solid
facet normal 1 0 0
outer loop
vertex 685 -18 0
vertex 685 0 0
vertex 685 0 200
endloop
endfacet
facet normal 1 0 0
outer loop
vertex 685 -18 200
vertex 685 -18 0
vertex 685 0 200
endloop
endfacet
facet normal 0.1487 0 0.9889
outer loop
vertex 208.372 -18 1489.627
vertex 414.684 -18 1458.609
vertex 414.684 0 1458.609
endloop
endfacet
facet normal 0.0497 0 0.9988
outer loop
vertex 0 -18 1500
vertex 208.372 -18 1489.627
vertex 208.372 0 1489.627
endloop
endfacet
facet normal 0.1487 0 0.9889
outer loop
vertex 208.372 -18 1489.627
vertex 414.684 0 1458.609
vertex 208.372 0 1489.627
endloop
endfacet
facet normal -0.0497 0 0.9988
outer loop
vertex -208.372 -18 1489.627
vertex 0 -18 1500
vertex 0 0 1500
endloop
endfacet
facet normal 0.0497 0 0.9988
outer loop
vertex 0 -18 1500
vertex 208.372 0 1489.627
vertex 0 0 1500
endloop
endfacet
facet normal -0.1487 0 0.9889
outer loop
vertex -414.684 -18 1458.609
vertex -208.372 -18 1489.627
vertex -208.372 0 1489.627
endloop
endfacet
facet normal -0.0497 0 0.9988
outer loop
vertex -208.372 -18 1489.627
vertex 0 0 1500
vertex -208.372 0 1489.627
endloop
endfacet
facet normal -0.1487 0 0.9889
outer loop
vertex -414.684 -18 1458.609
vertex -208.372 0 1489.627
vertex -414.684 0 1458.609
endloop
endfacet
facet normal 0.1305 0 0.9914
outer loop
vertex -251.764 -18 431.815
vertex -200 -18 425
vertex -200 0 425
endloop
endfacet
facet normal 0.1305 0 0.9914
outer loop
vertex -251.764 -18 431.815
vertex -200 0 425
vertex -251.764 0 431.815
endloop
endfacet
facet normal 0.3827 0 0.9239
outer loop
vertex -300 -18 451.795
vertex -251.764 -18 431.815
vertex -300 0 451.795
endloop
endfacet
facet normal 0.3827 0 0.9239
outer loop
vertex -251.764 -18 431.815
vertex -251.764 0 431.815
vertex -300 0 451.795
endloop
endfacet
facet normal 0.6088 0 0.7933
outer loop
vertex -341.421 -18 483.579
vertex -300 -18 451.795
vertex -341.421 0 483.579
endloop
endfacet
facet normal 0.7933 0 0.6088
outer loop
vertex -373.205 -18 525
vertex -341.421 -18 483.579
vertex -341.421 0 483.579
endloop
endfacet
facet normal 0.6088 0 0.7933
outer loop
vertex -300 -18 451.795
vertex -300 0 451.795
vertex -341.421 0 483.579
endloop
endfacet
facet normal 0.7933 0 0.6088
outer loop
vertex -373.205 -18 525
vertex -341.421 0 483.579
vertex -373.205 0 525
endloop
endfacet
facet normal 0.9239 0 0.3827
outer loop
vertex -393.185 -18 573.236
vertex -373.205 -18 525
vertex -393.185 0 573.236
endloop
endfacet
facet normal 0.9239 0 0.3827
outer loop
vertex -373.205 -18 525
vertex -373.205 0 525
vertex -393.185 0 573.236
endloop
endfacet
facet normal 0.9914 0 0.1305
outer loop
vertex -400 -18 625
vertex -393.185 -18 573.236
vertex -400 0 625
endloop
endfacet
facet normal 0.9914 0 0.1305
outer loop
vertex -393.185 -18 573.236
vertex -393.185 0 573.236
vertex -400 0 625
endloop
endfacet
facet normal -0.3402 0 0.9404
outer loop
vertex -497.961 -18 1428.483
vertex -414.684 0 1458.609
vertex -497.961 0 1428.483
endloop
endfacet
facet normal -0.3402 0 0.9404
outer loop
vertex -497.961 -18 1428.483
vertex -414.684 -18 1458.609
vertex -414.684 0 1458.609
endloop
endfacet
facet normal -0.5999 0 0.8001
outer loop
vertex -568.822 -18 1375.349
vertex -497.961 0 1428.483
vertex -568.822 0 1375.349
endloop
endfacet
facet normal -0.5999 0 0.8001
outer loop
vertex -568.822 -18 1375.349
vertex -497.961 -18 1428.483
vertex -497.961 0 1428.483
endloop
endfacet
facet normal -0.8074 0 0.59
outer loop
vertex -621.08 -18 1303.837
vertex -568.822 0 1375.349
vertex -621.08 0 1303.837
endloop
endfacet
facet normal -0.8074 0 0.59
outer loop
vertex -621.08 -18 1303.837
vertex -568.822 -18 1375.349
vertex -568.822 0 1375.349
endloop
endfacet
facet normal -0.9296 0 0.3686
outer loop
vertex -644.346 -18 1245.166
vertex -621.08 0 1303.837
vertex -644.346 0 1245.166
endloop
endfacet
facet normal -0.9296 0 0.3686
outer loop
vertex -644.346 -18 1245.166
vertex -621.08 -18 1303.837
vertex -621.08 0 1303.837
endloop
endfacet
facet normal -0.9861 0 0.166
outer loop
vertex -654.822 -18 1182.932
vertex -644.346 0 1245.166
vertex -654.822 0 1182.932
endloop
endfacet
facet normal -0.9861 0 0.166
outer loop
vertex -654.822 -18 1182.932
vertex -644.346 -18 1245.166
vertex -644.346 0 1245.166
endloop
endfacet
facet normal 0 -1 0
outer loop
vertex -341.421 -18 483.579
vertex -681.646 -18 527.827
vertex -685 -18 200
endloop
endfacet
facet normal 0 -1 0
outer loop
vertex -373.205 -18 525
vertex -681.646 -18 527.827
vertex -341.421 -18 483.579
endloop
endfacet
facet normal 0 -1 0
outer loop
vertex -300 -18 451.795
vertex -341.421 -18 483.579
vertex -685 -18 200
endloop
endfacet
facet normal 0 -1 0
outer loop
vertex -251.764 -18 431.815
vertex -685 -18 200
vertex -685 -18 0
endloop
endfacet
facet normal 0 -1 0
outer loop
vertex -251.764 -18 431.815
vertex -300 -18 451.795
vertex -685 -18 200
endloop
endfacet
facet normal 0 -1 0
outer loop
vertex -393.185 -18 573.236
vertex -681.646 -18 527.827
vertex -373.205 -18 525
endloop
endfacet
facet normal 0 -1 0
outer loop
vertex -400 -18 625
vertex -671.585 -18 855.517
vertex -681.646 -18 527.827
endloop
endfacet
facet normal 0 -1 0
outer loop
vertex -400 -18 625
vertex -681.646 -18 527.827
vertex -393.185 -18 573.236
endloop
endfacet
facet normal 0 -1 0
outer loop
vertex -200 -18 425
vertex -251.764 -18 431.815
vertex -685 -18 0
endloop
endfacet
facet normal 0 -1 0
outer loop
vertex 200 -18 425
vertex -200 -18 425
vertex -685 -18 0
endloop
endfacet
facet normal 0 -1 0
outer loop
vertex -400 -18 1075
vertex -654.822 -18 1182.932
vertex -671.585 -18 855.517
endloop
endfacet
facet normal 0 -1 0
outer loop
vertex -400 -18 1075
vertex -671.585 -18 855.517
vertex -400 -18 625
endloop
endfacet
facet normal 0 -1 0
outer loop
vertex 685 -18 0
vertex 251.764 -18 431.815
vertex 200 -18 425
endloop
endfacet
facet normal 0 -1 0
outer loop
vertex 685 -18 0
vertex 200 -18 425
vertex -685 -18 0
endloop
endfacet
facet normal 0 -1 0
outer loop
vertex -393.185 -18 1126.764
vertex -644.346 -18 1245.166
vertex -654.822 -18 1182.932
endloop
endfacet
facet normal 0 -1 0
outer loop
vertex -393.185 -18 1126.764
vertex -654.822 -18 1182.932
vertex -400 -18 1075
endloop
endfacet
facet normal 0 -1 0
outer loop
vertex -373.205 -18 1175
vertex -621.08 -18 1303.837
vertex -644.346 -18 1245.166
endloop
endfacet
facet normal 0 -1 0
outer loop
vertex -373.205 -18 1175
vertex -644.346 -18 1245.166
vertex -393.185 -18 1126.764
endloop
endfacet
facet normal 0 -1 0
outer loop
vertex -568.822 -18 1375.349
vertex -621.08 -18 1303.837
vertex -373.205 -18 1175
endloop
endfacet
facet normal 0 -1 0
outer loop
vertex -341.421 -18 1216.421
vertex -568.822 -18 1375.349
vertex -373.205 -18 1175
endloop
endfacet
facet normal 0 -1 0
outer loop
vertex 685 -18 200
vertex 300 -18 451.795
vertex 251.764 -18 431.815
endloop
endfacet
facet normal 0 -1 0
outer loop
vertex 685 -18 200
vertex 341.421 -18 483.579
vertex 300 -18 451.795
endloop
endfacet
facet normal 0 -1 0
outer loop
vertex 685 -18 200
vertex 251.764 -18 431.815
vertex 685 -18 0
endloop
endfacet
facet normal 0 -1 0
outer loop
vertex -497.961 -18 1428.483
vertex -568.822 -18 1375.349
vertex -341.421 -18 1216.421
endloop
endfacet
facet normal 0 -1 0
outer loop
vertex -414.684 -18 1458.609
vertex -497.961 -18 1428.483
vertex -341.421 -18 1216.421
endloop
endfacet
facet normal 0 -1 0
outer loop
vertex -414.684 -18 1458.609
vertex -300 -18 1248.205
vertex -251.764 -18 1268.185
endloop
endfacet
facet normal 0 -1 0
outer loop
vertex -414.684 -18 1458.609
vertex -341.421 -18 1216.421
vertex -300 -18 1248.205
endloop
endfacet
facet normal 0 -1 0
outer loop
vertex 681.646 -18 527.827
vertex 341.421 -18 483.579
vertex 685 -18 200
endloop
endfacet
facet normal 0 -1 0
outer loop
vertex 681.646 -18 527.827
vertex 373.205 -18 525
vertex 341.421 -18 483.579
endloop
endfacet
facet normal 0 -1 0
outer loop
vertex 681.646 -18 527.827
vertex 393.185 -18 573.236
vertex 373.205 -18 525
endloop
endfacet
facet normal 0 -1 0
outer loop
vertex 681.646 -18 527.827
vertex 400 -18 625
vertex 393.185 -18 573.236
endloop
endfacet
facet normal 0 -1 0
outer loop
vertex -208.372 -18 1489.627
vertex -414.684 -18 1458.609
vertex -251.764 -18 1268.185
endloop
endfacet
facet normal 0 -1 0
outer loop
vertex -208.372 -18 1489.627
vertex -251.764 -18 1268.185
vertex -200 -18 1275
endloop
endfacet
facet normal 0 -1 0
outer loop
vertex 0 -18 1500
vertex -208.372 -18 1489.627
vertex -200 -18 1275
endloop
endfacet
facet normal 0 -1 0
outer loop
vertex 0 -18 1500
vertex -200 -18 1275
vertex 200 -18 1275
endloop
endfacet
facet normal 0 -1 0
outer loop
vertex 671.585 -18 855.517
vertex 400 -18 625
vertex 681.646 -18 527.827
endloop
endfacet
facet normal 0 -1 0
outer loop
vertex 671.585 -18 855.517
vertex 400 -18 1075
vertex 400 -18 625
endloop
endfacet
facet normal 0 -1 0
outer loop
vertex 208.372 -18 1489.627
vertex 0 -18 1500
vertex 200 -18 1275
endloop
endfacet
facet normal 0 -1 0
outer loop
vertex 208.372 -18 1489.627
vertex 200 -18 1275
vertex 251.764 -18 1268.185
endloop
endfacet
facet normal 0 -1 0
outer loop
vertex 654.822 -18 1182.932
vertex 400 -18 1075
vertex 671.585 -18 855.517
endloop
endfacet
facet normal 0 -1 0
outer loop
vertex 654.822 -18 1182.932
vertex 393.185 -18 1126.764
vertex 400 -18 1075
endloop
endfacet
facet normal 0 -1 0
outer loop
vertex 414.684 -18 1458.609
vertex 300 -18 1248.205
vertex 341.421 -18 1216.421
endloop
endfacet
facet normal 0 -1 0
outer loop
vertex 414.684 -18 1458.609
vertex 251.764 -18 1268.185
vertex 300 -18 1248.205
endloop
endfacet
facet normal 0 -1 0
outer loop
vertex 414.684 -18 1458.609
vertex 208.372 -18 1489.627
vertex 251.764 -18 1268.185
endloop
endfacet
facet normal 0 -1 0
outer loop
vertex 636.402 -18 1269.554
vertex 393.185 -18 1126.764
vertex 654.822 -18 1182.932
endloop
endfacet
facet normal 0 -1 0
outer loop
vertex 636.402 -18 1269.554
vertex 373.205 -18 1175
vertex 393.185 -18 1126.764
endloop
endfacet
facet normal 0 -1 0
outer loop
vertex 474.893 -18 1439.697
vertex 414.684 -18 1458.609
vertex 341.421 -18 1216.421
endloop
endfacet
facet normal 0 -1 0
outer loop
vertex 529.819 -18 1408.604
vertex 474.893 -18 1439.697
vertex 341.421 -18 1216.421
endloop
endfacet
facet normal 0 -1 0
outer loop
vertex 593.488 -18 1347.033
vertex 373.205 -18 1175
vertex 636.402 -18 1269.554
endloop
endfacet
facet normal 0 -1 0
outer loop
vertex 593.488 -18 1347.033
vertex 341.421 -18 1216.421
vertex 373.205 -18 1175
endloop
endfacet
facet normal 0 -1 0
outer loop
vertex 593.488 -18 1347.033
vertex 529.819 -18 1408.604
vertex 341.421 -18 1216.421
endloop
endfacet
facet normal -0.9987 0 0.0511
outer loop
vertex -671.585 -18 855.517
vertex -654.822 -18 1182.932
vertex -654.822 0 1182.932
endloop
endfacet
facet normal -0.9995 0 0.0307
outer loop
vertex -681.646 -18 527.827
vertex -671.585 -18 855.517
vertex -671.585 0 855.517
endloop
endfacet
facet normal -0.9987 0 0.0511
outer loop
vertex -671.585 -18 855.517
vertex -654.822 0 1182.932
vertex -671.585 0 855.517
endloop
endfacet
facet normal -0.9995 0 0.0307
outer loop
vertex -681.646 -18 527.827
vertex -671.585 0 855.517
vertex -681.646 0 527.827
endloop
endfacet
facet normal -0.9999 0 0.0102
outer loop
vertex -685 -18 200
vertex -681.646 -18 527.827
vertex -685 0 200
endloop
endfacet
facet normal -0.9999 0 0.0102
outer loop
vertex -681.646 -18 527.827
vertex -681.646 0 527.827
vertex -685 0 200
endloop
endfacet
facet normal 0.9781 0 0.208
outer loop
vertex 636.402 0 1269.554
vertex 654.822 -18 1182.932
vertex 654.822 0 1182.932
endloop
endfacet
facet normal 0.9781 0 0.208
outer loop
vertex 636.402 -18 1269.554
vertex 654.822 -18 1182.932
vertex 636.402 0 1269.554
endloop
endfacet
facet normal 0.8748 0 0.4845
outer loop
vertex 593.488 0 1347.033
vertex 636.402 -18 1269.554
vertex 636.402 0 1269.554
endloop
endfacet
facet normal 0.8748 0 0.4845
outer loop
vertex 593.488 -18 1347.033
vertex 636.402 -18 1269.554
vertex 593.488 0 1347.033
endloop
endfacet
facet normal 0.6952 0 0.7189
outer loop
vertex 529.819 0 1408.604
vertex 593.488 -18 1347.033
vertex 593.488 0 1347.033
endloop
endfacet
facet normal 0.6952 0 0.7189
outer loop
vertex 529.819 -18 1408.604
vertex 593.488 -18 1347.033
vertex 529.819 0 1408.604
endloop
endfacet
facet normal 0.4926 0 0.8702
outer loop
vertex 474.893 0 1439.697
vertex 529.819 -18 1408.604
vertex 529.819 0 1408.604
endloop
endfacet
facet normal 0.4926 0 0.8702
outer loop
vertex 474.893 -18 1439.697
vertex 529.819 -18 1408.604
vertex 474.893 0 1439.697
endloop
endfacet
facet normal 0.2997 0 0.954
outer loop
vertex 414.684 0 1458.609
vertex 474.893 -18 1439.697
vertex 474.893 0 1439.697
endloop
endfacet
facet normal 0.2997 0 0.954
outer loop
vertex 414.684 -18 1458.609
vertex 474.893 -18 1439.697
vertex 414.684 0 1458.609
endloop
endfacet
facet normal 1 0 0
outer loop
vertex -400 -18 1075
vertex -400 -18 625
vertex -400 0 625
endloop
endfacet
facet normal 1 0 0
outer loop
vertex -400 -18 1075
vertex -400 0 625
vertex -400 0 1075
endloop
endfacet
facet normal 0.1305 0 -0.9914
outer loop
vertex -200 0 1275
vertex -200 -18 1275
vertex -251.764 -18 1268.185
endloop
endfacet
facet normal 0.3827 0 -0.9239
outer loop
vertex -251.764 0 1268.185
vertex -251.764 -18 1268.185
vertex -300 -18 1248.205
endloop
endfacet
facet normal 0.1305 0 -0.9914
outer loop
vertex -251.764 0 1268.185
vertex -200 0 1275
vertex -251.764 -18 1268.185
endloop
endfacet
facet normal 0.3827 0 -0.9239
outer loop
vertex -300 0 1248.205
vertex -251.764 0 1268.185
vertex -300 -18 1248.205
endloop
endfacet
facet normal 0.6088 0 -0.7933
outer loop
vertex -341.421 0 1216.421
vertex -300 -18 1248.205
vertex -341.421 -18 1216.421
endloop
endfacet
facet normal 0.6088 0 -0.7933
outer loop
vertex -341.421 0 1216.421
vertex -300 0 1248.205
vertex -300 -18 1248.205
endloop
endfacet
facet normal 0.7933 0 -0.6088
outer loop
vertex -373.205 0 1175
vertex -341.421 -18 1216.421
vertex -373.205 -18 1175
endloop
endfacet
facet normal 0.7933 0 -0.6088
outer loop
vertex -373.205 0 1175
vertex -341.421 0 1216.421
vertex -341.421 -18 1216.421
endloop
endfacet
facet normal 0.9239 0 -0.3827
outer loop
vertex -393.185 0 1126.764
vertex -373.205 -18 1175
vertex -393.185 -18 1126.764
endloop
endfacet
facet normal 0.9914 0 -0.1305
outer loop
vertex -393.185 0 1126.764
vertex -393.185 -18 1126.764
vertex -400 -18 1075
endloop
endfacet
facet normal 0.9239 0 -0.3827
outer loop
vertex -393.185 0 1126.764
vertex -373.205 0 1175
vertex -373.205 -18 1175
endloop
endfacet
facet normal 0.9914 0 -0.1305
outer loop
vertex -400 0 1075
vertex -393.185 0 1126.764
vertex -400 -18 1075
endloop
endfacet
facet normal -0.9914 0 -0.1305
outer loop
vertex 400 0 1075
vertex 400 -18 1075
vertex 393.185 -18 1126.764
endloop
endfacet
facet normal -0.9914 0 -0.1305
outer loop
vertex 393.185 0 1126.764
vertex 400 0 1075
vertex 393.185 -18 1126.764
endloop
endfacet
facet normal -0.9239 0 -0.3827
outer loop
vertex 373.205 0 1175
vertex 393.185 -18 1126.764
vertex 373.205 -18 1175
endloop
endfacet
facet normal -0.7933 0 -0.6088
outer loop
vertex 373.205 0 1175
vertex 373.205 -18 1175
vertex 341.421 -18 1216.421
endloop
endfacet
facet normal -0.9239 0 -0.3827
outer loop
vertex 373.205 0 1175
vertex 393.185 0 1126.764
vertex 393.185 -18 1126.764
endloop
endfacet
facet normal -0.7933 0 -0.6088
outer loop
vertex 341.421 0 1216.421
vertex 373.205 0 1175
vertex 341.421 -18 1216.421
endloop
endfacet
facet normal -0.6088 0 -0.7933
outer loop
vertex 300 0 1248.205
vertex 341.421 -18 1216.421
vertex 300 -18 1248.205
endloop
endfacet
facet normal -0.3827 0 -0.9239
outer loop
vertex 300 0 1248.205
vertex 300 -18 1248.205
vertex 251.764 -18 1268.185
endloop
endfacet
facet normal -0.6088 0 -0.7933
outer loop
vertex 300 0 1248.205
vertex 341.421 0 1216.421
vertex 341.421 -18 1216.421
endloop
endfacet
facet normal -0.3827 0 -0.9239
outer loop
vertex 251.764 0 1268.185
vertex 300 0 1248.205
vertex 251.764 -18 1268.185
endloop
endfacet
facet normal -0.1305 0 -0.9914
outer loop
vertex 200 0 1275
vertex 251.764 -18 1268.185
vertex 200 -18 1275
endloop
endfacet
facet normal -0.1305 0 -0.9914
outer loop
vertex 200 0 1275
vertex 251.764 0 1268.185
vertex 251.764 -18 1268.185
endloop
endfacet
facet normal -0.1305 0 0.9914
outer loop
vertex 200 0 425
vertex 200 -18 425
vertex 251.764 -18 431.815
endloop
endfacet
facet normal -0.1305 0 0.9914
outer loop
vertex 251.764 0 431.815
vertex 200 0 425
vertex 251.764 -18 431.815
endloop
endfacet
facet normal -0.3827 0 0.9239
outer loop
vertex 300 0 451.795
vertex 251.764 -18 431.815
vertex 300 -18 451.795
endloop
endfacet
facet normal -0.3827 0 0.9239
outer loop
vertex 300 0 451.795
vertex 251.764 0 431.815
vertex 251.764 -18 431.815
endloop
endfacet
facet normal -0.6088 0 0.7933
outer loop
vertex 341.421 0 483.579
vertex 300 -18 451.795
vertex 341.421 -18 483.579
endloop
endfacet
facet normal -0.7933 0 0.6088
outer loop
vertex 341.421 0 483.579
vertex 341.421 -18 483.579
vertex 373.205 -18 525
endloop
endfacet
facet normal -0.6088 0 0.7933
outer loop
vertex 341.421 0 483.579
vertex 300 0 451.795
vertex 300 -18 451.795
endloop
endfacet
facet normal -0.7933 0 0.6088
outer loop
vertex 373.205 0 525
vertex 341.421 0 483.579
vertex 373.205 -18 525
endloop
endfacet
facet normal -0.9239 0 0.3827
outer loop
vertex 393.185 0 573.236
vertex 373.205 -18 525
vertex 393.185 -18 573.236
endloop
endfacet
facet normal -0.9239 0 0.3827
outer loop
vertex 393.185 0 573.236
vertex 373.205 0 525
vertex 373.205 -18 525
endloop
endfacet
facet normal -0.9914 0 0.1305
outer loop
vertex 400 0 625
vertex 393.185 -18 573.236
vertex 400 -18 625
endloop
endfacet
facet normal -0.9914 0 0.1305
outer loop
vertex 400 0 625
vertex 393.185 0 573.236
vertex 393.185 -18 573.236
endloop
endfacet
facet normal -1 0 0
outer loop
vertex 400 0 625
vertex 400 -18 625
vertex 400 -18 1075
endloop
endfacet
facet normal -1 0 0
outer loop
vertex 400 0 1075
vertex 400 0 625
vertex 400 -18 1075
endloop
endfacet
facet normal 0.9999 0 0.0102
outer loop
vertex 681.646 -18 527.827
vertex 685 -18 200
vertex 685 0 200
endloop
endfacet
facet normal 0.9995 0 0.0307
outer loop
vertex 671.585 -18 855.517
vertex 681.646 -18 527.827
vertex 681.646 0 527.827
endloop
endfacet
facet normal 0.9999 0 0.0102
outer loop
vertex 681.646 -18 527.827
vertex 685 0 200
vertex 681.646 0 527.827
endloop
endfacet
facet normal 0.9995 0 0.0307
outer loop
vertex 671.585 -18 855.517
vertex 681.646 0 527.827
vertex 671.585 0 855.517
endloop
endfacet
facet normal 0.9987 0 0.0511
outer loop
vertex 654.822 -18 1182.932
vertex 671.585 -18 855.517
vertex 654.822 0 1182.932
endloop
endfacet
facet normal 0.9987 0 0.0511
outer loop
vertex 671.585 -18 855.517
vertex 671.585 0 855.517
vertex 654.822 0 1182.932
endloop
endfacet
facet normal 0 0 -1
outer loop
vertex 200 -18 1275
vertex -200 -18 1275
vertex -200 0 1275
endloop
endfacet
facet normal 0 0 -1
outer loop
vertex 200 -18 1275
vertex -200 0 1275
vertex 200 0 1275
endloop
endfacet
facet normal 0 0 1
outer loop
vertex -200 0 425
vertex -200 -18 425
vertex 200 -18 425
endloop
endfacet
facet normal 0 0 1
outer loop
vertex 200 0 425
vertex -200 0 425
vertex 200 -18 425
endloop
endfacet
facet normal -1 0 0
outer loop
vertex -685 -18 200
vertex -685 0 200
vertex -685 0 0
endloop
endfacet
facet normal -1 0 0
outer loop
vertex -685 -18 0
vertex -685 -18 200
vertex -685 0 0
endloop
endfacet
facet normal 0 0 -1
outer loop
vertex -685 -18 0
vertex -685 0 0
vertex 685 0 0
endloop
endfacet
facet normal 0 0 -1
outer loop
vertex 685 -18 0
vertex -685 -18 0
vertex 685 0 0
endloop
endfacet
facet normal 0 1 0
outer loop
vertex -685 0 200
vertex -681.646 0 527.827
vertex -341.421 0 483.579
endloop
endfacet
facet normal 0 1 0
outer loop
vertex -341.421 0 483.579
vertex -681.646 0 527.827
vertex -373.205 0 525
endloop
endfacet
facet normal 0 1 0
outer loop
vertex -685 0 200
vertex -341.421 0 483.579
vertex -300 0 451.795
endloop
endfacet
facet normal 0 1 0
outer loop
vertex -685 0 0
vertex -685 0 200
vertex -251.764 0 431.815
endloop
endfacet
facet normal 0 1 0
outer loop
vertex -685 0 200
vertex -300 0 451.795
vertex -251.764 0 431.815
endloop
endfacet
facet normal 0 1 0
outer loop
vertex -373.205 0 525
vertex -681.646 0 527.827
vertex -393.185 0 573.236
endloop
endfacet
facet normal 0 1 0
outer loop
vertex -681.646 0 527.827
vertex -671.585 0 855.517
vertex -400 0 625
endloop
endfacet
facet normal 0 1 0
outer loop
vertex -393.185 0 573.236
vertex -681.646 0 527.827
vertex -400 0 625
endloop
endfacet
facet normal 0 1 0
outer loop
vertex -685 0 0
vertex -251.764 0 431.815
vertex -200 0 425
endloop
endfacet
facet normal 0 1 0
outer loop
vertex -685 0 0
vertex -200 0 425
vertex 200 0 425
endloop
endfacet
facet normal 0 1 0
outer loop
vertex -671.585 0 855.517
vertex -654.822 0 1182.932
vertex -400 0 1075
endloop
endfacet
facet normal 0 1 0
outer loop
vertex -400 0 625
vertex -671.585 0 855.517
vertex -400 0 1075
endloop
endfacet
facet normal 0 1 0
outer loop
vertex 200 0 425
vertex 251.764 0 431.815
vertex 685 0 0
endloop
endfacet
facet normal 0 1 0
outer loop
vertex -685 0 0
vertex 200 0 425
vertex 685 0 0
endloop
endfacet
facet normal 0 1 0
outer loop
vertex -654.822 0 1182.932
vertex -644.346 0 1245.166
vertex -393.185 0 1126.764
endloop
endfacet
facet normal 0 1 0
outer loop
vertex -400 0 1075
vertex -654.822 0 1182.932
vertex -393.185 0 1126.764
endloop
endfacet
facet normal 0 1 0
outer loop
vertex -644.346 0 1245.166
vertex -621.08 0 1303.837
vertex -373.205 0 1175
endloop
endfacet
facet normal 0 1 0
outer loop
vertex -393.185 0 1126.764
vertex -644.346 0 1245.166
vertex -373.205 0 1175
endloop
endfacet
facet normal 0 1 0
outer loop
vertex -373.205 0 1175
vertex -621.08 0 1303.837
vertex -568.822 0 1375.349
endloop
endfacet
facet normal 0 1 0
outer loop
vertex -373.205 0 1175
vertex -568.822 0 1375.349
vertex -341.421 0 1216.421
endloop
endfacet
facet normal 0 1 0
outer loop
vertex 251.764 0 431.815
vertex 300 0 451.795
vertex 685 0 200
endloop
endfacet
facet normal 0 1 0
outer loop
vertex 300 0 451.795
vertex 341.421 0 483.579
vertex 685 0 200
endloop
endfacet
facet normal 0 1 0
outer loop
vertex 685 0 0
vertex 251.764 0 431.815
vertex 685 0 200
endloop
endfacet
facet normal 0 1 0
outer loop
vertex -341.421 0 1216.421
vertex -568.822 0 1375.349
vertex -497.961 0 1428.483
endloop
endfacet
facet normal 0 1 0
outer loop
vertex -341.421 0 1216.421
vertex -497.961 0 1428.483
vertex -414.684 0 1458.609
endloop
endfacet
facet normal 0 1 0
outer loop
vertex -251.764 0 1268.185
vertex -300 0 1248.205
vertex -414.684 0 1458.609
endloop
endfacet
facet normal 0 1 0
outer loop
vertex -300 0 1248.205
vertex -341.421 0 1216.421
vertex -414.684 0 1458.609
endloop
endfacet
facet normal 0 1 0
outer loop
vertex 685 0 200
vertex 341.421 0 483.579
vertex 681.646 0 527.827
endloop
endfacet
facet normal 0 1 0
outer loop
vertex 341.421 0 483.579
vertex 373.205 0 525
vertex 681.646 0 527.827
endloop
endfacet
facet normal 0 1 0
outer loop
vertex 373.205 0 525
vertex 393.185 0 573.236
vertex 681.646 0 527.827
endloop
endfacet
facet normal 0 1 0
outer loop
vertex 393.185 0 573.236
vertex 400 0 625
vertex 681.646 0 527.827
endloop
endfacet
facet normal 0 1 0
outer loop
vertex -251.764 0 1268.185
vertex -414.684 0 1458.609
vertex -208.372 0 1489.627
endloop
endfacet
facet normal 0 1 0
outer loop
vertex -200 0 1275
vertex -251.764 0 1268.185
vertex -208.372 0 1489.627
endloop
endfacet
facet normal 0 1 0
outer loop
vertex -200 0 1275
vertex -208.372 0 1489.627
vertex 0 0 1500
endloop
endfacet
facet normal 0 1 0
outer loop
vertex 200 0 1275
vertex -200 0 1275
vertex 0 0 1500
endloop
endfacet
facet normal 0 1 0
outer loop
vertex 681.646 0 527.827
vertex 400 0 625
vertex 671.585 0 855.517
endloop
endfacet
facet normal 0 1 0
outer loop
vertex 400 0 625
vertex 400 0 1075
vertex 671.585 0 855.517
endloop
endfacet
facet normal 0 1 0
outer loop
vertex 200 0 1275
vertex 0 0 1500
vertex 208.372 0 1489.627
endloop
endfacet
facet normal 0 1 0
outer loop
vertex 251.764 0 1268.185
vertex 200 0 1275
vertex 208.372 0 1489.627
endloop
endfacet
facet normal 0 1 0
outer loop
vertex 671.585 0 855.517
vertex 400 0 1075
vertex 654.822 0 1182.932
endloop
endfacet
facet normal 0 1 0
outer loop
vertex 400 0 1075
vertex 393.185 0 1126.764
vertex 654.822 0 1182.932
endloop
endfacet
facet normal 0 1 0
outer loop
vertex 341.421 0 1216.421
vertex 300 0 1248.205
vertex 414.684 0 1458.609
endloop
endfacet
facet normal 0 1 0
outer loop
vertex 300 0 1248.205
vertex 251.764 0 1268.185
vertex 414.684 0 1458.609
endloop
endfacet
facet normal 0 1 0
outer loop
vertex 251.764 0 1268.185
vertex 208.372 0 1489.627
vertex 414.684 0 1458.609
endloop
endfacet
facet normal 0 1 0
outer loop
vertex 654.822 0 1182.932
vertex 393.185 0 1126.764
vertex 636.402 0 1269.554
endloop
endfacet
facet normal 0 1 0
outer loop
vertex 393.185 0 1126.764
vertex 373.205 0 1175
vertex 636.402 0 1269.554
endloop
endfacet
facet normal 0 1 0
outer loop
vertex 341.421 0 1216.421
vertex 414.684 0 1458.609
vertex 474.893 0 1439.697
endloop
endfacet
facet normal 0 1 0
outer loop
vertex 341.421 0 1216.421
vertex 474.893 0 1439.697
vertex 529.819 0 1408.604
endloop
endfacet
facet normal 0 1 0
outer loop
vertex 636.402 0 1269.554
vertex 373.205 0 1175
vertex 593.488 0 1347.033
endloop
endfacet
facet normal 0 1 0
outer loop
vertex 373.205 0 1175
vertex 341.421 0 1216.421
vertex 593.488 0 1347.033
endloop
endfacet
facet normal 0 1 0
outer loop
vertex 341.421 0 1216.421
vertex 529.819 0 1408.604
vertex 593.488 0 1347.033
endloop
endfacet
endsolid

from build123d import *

# Parameters (mm, degrees)
F1_DEPTH = 18
F2_R     = 300
F3_W     = 800
F3_H     = 850
F4_DEPTH = 18.001
F5_R     = 200


with BuildPart() as f1:
    # F0 (on Front) → F1 (new body)
    with BuildSketch(Plane.XZ):
        with BuildLine():
            Line((-685, 200), (-685, 0))
            Line((-685, 0), (685, 0))
            Line((685, 0), (685, 200))
            ThreePointArc((685, 200), (673.746048, 800.421727), (640, 1400))
            ThreePointArc((640, 1400), (0, 1500), (-640, 1400))
            ThreePointArc((-640, 1400), (-673.746048, 800.421727), (-685, 200))
        make_face()
    extrude(amount=F1_DEPTH)

    # F2
    f2_edges = [f1.edges().sort_by_distance(p)[0] for p in [
        (-640, -9, 1400),
        (640, -9, 1400),
    ]]
    fillet(f2_edges, radius=F2_R)

    # F3 (on face) → F4 (cut, through all)
    with BuildSketch(Plane.XZ.offset(18)):
        with Locations((0, 850)):
            Rectangle(F3_W, F3_H)
    extrude(amount=-F4_DEPTH, mode=Mode.SUBTRACT)

    # F5
    f5_edges = [f1.edges().sort_by_distance(p)[0] for p in [
        (-400, -9, 425),
        (-400, -9, 1275),
        (400, -9, 425),
        (400, -9, 1275),
    ]]
    fillet(f5_edges, radius=F5_R)


solid = f1.part
